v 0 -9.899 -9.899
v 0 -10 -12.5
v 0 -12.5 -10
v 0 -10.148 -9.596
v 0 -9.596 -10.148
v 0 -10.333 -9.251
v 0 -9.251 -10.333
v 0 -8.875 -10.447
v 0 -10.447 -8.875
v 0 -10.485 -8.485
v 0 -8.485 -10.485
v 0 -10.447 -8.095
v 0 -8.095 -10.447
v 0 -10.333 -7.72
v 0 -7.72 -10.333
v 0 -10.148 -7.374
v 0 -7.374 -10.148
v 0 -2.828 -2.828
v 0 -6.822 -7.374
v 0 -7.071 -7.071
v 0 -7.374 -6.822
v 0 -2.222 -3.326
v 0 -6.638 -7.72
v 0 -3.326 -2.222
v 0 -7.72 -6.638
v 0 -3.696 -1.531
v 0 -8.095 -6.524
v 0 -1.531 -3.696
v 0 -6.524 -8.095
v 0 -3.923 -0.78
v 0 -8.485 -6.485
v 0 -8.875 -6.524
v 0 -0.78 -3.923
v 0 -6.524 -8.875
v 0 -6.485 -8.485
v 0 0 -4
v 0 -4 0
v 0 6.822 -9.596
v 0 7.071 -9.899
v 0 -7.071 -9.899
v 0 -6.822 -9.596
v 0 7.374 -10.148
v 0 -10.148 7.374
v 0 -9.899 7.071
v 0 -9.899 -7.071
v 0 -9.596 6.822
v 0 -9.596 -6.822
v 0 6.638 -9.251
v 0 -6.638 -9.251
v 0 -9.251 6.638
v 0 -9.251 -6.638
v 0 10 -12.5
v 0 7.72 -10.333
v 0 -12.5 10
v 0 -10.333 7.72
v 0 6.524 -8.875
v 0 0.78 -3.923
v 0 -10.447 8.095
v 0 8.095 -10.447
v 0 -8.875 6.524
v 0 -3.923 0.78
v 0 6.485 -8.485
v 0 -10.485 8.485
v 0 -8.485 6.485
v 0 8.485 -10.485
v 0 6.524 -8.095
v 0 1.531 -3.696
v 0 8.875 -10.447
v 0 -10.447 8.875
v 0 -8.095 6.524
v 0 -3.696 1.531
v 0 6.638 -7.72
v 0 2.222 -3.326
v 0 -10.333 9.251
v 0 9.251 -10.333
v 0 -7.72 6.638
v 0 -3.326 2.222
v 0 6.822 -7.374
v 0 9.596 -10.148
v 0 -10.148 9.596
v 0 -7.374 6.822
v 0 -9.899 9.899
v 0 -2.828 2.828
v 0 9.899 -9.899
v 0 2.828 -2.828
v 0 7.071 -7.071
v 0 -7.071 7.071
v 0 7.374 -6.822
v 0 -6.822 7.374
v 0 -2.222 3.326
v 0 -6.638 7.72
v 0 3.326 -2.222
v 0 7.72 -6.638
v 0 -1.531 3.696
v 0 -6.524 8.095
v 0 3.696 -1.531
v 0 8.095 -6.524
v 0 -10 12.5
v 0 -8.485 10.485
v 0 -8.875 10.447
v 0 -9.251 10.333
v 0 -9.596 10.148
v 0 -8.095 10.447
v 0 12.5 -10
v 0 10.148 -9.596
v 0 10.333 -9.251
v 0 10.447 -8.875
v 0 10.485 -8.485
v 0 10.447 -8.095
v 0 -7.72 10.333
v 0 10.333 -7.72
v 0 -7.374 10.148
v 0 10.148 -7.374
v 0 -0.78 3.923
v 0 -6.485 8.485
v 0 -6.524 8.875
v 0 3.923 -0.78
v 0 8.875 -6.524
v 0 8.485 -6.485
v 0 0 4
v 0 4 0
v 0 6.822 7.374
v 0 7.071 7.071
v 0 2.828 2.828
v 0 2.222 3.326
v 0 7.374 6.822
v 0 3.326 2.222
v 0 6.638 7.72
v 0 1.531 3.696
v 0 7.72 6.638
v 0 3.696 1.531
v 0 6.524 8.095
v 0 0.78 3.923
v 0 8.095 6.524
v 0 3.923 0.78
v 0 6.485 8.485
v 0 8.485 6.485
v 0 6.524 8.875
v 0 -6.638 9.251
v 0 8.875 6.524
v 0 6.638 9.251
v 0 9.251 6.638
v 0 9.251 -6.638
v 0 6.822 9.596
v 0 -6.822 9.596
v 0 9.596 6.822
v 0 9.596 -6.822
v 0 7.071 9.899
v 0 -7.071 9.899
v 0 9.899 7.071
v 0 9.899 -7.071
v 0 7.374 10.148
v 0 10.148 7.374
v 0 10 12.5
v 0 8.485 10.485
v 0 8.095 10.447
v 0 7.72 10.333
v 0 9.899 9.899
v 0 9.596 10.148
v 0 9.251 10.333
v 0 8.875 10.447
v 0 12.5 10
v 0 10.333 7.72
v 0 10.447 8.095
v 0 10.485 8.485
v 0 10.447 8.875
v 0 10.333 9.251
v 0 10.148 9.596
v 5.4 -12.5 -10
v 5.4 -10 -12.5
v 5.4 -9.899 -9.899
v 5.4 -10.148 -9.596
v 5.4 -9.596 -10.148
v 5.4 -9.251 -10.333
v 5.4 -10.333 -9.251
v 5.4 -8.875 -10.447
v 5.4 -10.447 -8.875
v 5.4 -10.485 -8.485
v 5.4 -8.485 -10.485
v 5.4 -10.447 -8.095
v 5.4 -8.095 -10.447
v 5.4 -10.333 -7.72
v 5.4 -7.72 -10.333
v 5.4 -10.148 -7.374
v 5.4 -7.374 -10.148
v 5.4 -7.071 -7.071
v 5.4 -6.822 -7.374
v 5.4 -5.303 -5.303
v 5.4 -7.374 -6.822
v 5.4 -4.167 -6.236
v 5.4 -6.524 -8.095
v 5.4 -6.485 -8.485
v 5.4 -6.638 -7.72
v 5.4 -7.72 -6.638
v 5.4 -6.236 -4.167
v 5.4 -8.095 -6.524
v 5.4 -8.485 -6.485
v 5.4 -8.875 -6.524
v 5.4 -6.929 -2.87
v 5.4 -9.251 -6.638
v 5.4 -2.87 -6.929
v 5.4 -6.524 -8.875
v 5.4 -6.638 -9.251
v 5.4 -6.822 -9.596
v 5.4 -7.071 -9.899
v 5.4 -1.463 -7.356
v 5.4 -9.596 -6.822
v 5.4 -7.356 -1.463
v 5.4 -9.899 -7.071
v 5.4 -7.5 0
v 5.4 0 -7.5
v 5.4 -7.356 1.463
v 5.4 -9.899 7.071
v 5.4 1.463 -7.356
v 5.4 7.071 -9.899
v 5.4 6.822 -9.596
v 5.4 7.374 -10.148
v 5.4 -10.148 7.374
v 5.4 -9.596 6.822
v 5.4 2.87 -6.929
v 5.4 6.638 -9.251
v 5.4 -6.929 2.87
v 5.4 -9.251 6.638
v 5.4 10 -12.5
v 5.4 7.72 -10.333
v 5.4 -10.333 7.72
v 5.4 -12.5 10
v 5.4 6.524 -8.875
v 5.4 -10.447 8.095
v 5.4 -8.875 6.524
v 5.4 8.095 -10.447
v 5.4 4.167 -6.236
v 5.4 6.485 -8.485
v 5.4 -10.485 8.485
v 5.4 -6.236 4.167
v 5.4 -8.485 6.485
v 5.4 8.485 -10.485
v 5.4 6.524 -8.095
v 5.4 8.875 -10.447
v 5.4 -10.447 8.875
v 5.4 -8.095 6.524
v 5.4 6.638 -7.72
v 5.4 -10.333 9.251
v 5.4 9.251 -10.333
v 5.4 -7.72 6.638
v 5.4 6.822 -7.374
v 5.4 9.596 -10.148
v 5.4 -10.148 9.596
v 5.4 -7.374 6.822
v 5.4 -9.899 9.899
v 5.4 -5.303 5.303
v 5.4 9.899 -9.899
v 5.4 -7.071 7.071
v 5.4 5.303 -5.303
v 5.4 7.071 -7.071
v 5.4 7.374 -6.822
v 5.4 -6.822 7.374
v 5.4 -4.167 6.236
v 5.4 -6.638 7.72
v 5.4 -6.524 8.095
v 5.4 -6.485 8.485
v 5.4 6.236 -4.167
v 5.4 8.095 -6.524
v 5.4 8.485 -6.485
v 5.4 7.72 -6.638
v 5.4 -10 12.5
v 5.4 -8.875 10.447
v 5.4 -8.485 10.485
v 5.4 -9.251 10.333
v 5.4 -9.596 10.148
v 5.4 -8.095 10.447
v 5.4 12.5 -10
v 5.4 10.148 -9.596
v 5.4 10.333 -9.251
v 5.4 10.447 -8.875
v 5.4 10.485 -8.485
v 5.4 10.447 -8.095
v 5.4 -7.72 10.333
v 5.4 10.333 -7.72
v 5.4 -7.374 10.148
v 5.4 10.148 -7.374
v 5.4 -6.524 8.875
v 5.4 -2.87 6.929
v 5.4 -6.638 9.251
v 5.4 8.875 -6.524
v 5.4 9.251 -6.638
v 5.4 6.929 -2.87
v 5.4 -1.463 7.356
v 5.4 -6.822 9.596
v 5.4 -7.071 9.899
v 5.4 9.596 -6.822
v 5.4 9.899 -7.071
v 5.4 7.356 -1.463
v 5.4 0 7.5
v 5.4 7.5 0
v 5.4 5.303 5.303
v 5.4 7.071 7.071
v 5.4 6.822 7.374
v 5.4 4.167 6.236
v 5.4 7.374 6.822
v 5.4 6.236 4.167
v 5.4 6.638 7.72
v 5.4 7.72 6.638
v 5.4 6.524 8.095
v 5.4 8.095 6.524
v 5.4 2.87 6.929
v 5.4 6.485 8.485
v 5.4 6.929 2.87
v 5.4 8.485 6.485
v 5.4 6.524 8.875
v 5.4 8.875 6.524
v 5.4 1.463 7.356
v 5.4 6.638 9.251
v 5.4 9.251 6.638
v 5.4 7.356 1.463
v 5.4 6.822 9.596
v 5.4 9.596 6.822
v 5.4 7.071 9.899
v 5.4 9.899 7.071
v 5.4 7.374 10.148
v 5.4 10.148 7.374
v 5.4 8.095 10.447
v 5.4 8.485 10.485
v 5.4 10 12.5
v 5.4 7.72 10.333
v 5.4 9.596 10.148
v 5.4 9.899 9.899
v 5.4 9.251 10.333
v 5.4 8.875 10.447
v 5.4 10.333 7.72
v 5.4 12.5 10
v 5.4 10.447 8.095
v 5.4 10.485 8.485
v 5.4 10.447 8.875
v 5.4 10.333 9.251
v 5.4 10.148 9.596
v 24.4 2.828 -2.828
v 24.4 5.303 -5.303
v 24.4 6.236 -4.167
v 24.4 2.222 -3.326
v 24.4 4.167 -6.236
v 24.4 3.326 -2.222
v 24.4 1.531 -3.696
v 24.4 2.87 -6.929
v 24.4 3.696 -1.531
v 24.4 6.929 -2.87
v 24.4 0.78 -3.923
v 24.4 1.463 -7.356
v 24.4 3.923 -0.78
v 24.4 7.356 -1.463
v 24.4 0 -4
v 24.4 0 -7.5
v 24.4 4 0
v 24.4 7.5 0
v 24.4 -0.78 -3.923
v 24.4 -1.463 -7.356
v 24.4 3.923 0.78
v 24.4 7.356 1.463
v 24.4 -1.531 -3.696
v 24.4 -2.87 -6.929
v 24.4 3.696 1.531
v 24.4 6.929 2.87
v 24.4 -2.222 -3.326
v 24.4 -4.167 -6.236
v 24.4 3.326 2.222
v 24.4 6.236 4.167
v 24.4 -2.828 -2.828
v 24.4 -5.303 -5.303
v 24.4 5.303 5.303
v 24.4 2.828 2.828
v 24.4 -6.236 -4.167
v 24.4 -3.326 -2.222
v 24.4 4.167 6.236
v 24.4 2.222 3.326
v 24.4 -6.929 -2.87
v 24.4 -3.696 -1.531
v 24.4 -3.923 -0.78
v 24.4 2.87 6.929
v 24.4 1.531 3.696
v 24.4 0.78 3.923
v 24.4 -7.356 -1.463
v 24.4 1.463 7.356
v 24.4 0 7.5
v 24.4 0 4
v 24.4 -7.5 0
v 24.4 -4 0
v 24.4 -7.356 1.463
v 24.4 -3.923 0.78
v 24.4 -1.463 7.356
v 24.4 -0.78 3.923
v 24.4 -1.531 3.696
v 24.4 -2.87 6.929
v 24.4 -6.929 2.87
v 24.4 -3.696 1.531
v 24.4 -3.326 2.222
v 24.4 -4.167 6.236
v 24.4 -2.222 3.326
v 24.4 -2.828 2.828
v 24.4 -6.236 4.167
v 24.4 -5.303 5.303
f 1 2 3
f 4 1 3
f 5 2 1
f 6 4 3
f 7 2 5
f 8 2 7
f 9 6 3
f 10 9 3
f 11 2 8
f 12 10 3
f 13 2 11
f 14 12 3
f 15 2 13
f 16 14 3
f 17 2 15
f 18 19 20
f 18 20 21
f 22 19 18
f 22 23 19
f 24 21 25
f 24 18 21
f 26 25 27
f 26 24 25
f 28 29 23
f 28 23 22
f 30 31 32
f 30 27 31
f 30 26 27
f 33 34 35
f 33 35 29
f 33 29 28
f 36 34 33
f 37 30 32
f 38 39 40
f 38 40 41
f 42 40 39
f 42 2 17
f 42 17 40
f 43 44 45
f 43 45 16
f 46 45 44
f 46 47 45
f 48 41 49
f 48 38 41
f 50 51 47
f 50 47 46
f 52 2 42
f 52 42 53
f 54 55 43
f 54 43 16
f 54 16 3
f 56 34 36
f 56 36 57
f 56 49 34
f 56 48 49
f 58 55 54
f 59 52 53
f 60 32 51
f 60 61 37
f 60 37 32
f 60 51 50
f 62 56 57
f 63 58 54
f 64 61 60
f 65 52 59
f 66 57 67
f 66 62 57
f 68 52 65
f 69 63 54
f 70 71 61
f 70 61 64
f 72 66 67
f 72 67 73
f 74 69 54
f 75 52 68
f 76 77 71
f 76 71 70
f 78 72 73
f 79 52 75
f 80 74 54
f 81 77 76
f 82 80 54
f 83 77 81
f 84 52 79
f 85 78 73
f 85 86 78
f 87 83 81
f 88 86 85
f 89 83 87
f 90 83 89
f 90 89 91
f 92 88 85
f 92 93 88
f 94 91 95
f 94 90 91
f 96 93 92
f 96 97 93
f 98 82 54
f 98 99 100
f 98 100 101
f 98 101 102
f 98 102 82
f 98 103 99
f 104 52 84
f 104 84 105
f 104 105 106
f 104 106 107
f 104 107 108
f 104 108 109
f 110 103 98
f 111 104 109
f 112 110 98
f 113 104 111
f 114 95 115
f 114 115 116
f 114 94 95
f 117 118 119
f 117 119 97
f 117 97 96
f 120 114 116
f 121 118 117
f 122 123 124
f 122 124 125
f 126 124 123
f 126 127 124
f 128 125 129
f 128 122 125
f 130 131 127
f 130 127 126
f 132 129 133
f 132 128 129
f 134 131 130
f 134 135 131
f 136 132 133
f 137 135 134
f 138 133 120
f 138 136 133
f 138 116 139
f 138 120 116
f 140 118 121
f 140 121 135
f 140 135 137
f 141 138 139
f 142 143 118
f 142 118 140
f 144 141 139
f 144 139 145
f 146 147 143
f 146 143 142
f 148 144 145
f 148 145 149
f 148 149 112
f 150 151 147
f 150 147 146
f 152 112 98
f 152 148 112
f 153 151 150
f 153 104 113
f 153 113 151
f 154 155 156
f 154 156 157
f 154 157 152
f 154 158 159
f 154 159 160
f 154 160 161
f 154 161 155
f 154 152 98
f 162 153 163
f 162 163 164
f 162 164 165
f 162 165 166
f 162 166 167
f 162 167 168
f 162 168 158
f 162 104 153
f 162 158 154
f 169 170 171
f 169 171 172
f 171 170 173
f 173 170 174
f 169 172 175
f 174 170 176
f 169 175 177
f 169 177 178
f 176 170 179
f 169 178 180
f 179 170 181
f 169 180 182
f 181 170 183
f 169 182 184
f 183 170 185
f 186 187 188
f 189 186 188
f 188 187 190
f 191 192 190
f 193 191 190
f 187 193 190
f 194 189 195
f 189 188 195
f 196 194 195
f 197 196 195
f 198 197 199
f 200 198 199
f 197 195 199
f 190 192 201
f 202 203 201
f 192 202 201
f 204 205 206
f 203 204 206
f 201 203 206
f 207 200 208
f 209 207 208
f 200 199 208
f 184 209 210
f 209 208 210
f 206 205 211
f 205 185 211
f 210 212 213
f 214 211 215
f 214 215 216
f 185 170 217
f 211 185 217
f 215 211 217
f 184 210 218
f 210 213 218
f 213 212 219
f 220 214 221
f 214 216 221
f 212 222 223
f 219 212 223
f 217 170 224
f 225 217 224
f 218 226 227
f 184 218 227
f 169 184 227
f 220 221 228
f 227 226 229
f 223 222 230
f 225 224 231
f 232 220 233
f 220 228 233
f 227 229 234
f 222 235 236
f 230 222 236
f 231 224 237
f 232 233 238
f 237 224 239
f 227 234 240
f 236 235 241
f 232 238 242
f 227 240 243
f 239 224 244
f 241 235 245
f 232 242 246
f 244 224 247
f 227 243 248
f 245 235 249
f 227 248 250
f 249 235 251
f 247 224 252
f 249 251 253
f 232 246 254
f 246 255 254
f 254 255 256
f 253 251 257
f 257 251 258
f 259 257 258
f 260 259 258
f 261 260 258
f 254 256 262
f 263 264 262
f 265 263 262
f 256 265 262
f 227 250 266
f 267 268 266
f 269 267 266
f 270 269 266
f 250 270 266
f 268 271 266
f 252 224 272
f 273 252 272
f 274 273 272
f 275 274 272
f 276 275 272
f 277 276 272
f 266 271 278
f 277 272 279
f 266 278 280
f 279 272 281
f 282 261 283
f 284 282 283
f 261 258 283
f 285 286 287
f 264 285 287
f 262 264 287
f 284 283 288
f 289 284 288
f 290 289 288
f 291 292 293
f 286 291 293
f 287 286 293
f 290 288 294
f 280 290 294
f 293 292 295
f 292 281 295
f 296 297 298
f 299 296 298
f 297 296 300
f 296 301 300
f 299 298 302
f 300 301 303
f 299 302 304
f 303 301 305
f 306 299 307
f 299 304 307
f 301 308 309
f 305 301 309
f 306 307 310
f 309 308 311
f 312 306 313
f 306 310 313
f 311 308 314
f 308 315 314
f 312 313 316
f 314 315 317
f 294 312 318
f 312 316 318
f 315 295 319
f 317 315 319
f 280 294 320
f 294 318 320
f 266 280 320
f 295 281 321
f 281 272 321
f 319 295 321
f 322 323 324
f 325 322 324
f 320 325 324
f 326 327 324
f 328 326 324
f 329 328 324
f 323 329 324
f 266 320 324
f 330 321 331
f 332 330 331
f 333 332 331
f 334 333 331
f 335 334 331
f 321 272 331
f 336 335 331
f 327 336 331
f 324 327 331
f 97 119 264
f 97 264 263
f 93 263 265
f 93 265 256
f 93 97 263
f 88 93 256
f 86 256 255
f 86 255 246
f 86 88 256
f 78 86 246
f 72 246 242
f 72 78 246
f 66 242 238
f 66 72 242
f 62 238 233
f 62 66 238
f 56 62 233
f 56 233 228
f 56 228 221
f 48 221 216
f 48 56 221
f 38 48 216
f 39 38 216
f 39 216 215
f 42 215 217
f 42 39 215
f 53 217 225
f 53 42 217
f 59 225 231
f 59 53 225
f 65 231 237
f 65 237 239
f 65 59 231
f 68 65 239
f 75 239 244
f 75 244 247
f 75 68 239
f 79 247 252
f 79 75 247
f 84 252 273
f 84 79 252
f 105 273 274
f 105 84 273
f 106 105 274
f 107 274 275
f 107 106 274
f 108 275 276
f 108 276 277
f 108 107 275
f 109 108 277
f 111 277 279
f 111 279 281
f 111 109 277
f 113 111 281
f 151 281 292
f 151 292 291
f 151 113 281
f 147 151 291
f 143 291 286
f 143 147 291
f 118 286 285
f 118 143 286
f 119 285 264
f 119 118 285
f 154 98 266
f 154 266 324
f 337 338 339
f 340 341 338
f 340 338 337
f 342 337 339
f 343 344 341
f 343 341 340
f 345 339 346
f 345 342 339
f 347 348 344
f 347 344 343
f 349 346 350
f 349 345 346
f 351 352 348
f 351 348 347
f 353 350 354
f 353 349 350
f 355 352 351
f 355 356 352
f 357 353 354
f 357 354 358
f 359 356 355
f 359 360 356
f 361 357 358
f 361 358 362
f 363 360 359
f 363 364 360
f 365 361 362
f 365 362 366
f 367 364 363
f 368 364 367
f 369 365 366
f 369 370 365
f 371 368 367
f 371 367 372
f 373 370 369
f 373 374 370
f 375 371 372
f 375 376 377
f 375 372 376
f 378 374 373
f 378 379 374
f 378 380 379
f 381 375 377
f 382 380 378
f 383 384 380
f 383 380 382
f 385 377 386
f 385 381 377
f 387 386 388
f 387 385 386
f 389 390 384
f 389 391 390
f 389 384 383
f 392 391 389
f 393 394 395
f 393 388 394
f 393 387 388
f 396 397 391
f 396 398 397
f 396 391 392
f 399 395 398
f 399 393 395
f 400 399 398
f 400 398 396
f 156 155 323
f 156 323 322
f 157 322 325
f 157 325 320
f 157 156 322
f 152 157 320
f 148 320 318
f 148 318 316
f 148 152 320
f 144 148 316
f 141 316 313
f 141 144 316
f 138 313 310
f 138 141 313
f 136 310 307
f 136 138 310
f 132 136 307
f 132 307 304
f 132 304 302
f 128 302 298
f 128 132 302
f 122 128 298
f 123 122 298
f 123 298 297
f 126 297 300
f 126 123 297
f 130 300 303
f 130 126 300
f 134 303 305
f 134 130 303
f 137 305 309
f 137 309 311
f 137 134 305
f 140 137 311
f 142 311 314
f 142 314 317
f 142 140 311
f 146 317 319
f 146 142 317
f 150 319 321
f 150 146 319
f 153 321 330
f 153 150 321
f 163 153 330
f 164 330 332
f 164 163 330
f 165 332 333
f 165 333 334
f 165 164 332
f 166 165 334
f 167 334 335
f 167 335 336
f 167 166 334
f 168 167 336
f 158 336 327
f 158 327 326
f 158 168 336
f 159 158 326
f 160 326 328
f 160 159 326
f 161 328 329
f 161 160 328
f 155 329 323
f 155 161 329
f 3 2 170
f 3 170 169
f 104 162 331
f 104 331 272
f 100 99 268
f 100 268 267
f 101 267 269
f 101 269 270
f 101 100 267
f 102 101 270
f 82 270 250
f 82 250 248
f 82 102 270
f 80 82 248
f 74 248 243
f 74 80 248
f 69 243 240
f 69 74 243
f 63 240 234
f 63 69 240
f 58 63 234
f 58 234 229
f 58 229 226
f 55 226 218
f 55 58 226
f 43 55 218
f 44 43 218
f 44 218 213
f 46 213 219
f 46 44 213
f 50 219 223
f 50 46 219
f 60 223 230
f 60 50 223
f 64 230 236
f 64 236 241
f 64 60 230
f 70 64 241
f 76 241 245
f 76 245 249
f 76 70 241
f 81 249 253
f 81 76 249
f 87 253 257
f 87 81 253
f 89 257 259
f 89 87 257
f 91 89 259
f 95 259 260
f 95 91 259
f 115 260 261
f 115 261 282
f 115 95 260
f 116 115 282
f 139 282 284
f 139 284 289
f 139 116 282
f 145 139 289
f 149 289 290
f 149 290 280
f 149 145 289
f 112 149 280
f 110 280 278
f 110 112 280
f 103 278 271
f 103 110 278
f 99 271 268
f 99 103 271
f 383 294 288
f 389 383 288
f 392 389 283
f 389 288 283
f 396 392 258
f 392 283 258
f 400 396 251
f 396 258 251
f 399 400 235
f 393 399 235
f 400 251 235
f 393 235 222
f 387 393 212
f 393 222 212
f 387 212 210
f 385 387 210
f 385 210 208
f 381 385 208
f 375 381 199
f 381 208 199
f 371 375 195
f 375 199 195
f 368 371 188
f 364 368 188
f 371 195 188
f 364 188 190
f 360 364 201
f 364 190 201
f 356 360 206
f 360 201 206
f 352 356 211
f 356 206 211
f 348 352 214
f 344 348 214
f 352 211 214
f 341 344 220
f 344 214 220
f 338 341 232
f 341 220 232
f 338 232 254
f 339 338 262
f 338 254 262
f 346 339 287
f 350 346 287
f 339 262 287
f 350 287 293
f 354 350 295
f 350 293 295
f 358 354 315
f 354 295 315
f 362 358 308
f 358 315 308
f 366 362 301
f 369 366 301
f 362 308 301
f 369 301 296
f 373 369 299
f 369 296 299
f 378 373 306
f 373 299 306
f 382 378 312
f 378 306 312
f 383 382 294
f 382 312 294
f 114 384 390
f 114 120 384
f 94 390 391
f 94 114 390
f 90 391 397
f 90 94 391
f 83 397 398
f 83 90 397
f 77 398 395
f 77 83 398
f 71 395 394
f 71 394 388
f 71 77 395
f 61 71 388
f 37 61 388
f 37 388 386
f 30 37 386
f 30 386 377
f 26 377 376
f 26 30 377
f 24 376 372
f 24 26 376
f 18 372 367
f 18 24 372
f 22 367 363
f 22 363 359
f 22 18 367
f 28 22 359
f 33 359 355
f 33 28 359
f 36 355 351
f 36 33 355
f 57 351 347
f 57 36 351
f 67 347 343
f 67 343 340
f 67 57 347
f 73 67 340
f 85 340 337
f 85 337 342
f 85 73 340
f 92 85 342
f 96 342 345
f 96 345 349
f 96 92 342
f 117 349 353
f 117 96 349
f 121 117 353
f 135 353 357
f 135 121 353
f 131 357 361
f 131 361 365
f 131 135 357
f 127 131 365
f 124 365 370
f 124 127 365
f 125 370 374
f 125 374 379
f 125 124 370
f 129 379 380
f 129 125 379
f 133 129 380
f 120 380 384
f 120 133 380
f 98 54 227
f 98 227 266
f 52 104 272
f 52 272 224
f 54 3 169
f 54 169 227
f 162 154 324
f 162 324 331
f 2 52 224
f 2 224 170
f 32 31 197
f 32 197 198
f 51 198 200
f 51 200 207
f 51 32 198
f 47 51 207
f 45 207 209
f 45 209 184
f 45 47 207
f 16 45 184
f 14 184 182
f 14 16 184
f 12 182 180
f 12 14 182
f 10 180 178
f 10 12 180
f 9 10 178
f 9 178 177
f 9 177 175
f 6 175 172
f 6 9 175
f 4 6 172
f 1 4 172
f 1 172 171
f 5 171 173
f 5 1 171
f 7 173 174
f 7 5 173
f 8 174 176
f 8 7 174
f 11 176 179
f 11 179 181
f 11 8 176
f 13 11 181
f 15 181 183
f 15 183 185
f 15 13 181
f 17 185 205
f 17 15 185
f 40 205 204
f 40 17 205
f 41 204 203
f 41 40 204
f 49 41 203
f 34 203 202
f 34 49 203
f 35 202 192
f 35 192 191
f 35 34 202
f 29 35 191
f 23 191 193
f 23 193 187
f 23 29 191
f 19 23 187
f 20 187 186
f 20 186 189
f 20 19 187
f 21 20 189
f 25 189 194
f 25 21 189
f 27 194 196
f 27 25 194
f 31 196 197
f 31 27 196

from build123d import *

# Parameters (mm, degrees)
SKETCH1_R           = 4
SKETCH1_R_2         = 2
BOSS_EXTRUDE1_DEPTH = 5.4
SKETCH2_R           = 7.5
SKETCH2_R_2         = 4
BOSS_EXTRUDE2_DEPTH = 19


with BuildPart() as part:
    # Sketch1 → Boss-Extrude1 (new body)
    with BuildSketch(Plane(origin=(0, 0, 0), x_dir=(0, 0, -1), z_dir=(1, 0, 0))):
        Polygon((-12.5, 10), (-10, 12.5), (10, 12.5), (12.5, 10), (12.5, -10), (10, -12.5), (-10, -12.5), (-12.5, -10), align=None)
        with Locations(Location((0, 0, 0), (0, 0, 180))):
            Circle(SKETCH1_R, mode=Mode.SUBTRACT)
        with Locations(Location((8.485281374, 8.485281374, 0), (0, 0, 180))):
            Circle(SKETCH1_R_2, mode=Mode.SUBTRACT)
        with Locations(Location((8.485281374, -8.485281374, 0), (0, 0, 180))):
            Circle(SKETCH1_R_2, mode=Mode.SUBTRACT)
        with Locations(Location((-8.485281374, -8.485281374, 0), (0, 0, 180))):
            Circle(SKETCH1_R_2, mode=Mode.SUBTRACT)
        with Locations(Location((-8.485281374, 8.485281374, 0), (0, 0, 180))):
            Circle(SKETCH1_R_2, mode=Mode.SUBTRACT)
    extrude(amount=BOSS_EXTRUDE1_DEPTH)

    # Sketch2 → Boss-Extrude2 (add)
    with BuildSketch(Plane(origin=(5.4, 0, 0), x_dir=(0, 0, -1), z_dir=(1, 0, 0))):
        with Locations(Location((0, 0, 0), (0, 0, 180))):
            Circle(SKETCH2_R)
        with Locations(Location((0, 0, 0), (0, 0, 180))):
            Circle(SKETCH2_R_2, mode=Mode.SUBTRACT)
    extrude(amount=BOSS_EXTRUDE2_DEPTH)


solid = part.part
